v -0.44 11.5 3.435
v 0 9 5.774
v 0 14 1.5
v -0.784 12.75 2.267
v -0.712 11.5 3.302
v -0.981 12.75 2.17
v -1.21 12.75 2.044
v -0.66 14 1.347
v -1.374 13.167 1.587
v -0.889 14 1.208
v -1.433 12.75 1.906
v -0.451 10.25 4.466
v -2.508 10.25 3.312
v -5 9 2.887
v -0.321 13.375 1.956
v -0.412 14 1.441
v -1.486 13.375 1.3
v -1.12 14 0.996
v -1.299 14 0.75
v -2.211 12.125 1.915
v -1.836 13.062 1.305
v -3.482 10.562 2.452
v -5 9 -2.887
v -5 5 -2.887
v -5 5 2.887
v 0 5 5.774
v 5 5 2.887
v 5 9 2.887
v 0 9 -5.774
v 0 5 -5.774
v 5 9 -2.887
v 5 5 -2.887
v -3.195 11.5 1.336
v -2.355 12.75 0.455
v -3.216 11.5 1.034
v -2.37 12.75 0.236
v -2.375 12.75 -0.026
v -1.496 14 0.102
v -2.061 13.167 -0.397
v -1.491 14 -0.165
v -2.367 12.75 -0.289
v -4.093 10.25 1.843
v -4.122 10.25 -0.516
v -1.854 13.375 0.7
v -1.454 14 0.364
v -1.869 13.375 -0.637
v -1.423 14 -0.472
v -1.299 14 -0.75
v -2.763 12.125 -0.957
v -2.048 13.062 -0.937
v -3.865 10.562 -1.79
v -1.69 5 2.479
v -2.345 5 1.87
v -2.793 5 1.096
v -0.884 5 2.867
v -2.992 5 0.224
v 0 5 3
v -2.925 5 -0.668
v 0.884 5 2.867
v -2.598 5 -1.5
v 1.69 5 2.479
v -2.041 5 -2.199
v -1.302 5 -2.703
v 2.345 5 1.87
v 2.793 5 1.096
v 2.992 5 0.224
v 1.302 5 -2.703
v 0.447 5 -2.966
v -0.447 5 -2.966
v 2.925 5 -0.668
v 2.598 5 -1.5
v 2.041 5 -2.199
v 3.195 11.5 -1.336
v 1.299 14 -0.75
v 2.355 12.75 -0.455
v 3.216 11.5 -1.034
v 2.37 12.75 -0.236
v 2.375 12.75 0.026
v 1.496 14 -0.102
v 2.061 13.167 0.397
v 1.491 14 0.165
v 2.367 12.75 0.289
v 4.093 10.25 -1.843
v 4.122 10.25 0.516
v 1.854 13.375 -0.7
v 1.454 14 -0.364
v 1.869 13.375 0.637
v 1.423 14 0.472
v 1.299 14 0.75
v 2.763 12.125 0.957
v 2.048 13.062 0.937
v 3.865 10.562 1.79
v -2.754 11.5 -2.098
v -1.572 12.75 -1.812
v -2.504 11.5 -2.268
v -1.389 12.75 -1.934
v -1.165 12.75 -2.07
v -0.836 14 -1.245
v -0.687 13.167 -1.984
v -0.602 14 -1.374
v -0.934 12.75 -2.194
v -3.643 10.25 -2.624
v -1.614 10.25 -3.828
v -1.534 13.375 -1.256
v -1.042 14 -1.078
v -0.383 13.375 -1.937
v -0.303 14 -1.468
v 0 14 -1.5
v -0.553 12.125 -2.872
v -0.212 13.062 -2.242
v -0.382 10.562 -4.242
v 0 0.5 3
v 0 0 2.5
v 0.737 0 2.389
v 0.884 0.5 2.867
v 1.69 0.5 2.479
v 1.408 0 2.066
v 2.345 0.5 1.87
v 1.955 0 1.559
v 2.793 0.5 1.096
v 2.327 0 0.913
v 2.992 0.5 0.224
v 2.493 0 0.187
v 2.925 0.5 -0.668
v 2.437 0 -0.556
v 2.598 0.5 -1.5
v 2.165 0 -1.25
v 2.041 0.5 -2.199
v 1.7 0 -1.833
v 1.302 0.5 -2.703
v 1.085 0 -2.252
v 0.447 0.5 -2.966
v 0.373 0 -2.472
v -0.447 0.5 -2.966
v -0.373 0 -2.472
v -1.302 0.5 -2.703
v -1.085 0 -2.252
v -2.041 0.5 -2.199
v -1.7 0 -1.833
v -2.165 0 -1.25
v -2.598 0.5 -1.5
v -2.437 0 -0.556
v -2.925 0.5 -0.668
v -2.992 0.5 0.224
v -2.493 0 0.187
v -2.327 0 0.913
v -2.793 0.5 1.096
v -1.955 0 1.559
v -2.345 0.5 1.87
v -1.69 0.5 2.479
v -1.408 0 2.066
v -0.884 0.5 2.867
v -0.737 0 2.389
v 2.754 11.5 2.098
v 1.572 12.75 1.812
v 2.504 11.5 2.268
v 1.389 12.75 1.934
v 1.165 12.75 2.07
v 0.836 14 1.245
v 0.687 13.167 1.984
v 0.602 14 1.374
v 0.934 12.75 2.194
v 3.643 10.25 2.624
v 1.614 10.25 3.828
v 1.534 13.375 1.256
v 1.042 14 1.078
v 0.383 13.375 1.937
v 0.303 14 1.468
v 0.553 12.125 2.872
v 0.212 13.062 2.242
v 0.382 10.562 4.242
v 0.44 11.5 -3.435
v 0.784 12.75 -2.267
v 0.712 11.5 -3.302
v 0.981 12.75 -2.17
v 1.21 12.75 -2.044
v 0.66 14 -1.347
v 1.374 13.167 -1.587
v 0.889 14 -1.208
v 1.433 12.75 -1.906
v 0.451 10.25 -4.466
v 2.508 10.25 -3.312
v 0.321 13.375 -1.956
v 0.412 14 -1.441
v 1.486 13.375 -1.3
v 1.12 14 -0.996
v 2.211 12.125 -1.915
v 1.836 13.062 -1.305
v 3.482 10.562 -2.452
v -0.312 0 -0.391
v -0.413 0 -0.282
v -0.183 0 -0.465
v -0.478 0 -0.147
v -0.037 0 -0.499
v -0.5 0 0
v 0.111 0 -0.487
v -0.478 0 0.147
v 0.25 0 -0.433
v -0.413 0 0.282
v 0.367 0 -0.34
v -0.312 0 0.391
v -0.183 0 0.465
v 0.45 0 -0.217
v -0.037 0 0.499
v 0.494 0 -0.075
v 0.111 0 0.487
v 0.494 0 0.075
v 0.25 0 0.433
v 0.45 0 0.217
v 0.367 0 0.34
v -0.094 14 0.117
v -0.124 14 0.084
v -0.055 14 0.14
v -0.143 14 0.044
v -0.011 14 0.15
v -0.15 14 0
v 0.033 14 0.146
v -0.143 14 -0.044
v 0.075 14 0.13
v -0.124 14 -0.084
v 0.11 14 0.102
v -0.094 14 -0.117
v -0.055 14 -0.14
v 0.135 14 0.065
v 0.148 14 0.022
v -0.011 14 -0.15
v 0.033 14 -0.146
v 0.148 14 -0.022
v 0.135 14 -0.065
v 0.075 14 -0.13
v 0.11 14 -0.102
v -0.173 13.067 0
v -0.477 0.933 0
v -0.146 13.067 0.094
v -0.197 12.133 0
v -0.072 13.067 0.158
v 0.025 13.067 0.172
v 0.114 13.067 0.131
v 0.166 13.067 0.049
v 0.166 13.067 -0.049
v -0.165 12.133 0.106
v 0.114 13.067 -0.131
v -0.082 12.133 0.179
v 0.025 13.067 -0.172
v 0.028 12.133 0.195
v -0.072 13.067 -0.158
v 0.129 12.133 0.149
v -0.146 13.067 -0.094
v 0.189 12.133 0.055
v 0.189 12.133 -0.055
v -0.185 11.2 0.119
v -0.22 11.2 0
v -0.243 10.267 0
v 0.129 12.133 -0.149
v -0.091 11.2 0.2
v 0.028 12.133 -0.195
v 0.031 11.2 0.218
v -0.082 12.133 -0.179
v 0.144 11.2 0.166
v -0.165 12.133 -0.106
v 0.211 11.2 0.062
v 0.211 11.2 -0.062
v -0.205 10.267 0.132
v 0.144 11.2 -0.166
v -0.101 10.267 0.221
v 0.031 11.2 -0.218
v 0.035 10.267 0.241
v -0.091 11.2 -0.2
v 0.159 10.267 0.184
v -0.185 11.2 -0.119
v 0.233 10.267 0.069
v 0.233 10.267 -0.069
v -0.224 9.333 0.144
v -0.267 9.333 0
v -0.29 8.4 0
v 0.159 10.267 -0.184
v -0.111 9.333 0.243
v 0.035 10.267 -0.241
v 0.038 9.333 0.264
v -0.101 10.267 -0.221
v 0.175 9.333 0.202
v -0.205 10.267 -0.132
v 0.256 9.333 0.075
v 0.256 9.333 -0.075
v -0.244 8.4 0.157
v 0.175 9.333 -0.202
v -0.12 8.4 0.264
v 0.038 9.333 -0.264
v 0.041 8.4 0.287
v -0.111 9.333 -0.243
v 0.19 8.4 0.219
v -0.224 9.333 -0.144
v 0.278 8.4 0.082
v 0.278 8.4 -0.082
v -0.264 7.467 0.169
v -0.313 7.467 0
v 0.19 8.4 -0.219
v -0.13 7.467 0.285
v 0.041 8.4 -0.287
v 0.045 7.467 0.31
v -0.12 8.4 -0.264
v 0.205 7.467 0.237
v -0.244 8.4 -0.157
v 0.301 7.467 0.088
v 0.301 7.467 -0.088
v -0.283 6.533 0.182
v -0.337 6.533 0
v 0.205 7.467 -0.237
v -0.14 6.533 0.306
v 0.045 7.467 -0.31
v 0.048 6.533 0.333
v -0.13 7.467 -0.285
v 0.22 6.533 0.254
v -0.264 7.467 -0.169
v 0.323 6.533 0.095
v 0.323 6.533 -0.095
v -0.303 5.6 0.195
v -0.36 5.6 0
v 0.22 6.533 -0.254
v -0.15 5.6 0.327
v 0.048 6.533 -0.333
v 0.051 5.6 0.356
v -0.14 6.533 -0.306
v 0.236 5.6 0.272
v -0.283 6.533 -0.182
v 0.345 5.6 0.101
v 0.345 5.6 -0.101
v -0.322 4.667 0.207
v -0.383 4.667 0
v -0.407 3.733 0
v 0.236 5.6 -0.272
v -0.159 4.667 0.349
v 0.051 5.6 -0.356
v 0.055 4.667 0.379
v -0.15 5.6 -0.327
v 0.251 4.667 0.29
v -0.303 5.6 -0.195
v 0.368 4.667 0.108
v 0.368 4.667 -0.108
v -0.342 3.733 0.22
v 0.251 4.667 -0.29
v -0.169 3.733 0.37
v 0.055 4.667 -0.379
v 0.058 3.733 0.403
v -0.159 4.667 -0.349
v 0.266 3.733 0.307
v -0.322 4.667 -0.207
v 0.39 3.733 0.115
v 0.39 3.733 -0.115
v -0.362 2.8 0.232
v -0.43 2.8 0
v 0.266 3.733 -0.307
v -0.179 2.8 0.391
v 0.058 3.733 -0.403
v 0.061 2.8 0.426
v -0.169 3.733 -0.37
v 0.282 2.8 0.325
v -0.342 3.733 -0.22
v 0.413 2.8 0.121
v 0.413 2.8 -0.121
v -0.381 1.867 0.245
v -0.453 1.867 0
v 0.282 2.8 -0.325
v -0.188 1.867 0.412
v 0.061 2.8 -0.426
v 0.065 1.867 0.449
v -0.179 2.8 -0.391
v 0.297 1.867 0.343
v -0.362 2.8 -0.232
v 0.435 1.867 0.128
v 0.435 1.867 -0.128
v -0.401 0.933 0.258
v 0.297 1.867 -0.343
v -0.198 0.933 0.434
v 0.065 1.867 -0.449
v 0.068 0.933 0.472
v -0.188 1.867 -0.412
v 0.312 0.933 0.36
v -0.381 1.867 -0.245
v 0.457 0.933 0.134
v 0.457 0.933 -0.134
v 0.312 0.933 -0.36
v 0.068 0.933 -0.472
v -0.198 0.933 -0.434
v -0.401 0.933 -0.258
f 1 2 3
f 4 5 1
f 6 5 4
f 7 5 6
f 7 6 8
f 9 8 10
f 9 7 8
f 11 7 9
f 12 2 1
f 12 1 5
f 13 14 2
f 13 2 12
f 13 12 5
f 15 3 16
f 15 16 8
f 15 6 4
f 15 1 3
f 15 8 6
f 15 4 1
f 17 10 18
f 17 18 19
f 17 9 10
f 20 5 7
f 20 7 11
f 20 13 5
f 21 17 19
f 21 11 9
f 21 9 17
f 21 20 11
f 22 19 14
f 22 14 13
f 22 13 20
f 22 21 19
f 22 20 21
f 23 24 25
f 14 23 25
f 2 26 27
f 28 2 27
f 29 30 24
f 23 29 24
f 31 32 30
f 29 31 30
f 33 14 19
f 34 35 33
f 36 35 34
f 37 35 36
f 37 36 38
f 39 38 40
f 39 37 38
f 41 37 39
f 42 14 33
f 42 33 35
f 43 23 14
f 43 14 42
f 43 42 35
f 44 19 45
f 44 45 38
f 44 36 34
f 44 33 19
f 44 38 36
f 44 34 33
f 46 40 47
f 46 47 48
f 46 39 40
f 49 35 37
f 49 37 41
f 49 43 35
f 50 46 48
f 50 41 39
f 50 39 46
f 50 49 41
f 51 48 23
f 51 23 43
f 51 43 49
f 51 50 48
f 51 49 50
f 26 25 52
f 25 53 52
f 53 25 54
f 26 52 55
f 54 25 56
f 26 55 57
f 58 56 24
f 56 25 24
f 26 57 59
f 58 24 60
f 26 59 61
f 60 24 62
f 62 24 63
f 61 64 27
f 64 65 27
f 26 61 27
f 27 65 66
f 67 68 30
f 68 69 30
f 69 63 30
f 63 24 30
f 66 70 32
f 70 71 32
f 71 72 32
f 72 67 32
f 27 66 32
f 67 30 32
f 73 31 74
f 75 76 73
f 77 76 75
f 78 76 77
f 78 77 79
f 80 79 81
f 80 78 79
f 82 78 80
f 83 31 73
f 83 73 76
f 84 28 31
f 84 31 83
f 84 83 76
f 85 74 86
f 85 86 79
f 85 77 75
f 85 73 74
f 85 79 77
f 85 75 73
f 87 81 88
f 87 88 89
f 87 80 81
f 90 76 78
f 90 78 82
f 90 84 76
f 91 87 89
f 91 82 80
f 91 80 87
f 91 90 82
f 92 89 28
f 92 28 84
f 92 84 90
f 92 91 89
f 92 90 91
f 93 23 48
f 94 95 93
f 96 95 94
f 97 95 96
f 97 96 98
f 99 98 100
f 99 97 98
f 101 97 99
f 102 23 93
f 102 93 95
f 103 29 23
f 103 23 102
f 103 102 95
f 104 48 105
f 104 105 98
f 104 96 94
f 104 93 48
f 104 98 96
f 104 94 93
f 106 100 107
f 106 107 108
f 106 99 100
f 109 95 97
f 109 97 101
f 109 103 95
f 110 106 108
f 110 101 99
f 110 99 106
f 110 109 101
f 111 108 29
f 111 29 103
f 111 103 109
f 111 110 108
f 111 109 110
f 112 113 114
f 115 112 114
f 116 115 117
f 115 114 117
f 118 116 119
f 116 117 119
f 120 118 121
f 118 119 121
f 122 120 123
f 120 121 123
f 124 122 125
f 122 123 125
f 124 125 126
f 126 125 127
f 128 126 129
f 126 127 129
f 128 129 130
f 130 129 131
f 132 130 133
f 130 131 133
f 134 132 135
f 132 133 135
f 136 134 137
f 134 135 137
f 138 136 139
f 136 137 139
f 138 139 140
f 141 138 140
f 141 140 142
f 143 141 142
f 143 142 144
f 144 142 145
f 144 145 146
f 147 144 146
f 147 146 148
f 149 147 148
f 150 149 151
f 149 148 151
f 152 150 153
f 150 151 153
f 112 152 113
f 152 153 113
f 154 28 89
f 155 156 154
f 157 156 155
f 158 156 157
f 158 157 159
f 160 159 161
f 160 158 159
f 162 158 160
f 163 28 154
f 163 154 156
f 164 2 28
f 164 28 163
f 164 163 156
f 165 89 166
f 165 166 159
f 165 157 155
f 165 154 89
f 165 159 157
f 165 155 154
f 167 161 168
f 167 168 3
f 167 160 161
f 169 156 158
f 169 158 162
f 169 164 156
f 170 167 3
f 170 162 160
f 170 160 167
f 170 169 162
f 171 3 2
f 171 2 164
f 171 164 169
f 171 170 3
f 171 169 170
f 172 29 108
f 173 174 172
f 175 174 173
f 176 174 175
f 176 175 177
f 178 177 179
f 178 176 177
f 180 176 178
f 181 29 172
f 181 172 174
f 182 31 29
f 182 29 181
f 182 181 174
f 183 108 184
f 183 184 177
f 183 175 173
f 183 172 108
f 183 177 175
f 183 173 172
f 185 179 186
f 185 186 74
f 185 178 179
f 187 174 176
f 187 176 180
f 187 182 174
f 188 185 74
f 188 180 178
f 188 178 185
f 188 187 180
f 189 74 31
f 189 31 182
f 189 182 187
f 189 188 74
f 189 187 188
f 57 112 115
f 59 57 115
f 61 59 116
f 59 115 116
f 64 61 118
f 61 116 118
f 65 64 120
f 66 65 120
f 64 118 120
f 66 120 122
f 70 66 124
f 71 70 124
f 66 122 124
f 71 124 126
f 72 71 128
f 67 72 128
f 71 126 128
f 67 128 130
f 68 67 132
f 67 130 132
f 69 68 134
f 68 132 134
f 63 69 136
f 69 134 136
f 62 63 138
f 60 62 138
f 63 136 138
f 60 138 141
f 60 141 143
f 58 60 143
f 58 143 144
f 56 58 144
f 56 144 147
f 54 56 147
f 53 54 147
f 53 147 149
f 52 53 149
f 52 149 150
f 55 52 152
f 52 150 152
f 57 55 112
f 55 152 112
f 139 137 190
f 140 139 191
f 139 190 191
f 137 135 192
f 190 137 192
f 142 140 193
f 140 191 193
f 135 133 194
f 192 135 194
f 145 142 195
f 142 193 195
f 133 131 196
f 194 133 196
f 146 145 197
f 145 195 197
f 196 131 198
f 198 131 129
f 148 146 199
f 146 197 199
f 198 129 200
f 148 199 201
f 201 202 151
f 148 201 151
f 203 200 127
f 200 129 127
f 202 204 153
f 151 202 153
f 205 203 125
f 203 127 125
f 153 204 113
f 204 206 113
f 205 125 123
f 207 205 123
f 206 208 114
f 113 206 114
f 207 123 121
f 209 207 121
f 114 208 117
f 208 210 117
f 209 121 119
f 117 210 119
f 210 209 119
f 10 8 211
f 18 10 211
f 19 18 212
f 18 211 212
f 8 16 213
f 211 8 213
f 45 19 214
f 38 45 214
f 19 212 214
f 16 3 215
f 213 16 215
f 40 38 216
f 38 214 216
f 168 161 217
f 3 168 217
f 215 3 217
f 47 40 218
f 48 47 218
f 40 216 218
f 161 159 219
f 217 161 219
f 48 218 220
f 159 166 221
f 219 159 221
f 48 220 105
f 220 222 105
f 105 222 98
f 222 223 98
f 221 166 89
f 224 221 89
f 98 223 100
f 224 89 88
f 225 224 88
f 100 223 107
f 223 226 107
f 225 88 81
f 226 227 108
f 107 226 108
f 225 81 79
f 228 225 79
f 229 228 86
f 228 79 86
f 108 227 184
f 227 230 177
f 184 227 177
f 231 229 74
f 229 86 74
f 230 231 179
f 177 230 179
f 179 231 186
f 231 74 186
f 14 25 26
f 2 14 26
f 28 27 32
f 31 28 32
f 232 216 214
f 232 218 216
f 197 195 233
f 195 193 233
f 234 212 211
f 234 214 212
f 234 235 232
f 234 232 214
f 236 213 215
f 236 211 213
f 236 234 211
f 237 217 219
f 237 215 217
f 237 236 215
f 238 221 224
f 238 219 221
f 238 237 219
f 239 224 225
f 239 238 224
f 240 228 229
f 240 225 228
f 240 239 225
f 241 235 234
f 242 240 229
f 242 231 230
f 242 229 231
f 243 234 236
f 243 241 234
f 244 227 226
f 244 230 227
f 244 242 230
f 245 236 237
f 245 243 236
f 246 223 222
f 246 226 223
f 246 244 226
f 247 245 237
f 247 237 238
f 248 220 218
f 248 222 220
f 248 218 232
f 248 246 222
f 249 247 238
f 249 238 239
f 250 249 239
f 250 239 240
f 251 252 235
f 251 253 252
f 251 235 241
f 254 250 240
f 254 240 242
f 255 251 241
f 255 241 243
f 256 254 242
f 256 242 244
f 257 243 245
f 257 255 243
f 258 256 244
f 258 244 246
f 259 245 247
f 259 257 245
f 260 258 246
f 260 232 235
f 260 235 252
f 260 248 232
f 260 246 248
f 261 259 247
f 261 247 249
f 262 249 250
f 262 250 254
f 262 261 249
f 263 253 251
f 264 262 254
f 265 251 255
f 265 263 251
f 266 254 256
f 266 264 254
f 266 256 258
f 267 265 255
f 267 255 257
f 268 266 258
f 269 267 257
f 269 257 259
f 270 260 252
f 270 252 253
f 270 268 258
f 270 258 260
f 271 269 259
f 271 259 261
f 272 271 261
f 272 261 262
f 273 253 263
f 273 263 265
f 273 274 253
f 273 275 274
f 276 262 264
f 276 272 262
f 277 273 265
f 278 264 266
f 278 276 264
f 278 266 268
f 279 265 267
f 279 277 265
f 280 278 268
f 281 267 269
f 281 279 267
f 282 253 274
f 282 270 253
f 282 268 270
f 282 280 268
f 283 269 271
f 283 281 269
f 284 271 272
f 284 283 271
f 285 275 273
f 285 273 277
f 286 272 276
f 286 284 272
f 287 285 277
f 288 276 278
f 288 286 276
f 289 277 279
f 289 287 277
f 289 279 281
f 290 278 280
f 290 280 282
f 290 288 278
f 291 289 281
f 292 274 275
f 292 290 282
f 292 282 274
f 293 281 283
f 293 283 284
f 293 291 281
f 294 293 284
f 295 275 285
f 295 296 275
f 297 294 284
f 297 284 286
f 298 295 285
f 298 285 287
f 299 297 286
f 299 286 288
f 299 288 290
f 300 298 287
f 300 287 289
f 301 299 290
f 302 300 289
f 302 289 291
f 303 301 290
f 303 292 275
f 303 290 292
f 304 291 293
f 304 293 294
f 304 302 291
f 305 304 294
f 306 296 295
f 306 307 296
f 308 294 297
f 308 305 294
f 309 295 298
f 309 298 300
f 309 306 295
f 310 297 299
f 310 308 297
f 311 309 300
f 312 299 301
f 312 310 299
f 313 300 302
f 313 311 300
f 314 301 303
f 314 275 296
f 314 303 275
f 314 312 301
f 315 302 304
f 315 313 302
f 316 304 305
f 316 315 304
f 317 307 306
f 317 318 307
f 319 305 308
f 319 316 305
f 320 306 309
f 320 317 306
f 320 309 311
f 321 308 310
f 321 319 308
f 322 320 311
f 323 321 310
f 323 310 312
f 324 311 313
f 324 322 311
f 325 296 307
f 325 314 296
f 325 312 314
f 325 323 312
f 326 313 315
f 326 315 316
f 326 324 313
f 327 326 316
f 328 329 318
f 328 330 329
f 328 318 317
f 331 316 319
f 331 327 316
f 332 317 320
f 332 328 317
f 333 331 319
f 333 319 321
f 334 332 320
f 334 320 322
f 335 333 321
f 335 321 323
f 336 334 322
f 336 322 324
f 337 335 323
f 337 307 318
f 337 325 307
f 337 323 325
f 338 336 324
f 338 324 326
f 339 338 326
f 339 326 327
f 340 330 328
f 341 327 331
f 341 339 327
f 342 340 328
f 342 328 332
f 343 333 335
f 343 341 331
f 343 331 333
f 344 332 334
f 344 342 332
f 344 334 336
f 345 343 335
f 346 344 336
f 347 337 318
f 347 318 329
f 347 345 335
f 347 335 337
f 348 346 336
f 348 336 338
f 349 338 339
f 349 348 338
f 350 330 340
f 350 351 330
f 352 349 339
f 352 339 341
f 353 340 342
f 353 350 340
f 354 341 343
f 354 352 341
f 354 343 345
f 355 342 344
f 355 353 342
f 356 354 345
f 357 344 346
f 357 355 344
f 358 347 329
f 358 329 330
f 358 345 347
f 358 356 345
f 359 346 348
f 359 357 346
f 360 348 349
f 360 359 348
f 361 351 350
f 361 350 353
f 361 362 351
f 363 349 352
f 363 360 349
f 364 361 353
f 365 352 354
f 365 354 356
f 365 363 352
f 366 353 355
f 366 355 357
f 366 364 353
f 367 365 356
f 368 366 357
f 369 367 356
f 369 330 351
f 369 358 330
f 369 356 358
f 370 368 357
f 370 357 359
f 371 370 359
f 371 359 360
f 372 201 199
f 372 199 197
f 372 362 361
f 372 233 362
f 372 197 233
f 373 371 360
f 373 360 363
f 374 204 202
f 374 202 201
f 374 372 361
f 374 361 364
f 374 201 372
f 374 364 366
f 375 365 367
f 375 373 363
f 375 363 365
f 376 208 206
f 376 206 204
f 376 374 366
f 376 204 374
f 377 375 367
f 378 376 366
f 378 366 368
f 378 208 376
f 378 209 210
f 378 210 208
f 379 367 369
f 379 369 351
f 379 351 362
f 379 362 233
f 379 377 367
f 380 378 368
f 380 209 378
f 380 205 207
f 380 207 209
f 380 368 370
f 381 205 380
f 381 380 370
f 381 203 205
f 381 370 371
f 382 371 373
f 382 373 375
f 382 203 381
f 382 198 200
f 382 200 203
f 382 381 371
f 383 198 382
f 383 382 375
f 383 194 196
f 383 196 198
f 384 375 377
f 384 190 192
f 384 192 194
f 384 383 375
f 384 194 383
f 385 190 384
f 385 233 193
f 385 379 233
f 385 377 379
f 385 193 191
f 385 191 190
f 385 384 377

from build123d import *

# Parameters (mm, degrees)
SKETCH1_R           = 3
BOSS_EXTRUDE1_DEPTH = 5
BOSS_EXTRUDE2_DEPTH = 4
CHAMFER1_SIZE       = 0.5
SKETCH5_R           = 0.15
SKETCH4_R           = 0.5


with BuildPart() as part:
    # Sketch1 → Boss-Extrude1 (new body)
    with BuildSketch(Plane(origin=(0, 0, 0), x_dir=(1, 0, 0), z_dir=(0, 1, 0))):
        with Locations(Location((0, 0, 0), (0, 0, 270))):
            Circle(SKETCH1_R)
    extrude(amount=BOSS_EXTRUDE1_DEPTH)

    # Sketch2 → Boss-Extrude2 (add)
    with BuildSketch(Plane(origin=(0, 5, 0), x_dir=(1, 0, 0), z_dir=(0, 1, 0))):
        Polygon((0, 5.773502692), (-5, 2.886751346), (-5, -2.886751346), (0, -5.773502692), (5, -2.886751346), (5, 2.886751346), align=None)
    extrude(amount=BOSS_EXTRUDE2_DEPTH)

    # Chamfer1
    chamfer1_edges = [part.edges().sort_by_distance(p)[0] for p in [
        (0, 0, -3),
    ]]
    chamfer(chamfer1_edges, length=CHAMFER1_SIZE)

    # Loft1: read off the stored shape, not the designer's step
    # Loft1: loft between two sections, ruled curve by curve
    loft1_from = [
        Edge.make_bspline([(1.299038106, 14, -0.75), (1.424038106, 14, -0.533493649), (1.5, 14, -0.267949192), (1.5, 14, 0.267949192), (1.424038106, 14, 0.533493649), (1.299038106, 14, 0.75)], [0, 0, 0, 0, 0.5, 0.5, 1, 1, 1, 1], 3),
        Edge.make_bspline([(1.299038106, 14, 0.75), (1.174038106, 14, 0.966506351), (0.982050808, 14, 1.165063509), (0.517949192, 14, 1.433012702), (0.25, 14, 1.5), (0, 14, 1.5)], [0, 0, 0, 0, 0.5, 0.5, 1, 1, 1, 1], 3),
        Edge.make_bspline([(0, 14, -1.5), (0.25, 14, -1.5), (0.517949192, 14, -1.433012702), (0.982050808, 14, -1.165063509), (1.174038106, 14, -0.966506351), (1.299038106, 14, -0.75)], [0, 0, 0, 0, 0.5, 0.5, 1, 1, 1, 1], 3),
        Edge.make_bspline([(0, 14, 1.5), (-0.25, 14, 1.5), (-0.517949192, 14, 1.433012702), (-0.982050808, 14, 1.165063509), (-1.174038106, 14, 0.966506351), (-1.299038106, 14, 0.75)], [0, 0, 0, 0, 0.5, 0.5, 1, 1, 1, 1], 3),
        Edge.make_bspline([(-1.299038106, 14, 0.75), (-1.424038106, 14, 0.533493649), (-1.5, 14, 0.267949192), (-1.5, 14, -0.267949192), (-1.424038106, 14, -0.533493649), (-1.299038106, 14, -0.75)], [0, 0, 0, 0, 0.5, 0.5, 1, 1, 1, 1], 3),
        Edge.make_bspline([(-1.299038106, 14, -0.75), (-1.174038106, 14, -0.966506351), (-0.982050808, 14, -1.165063509), (-0.517949192, 14, -1.433012702), (-0.25, 14, -1.5), (0, 14, -1.5)], [0, 0, 0, 0, 0.5, 0.5, 1, 1, 1, 1], 3),
    ]
    loft1_to = [
        Edge.make_bspline([(5, 9, -2.886751346), (5, 9, -1.924500897), (5, 9, -0.962250449), (5, 9, 0.962250449), (5, 9, 1.924500897), (5, 9, 2.886751346)], [0, 0, 0, 0, 0.5, 0.5, 1, 1, 1, 1], 3),
        Edge.make_bspline([(5, 9, 2.886751346), (4.166666667, 9, 3.36787657), (3.333333333, 9, 3.849001795), (1.666666667, 9, 4.811252243), (0.833333333, 9, 5.292377468), (0, 9, 5.773502692)], [0, 0, 0, 0, 0.5, 0.5, 1, 1, 1, 1], 3),
        Edge.make_bspline([(0, 9, -5.773502692), (0.833333333, 9, -5.292377468), (1.666666667, 9, -4.811252243), (3.333333333, 9, -3.849001795), (4.166666667, 9, -3.36787657), (5, 9, -2.886751346)], [0, 0, 0, 0, 0.5, 0.5, 1, 1, 1, 1], 3),
        Edge.make_bspline([(0, 9, 5.773502692), (-0.833333333, 9, 5.292377468), (-1.666666667, 9, 4.811252243), (-3.333333333, 9, 3.849001795), (-4.166666667, 9, 3.36787657), (-5, 9, 2.886751346)], [0, 0, 0, 0, 0.5, 0.5, 1, 1, 1, 1], 3),
        Edge.make_bspline([(-5, 9, 2.886751346), (-5, 9, 1.924500897), (-5, 9, 0.962250449), (-5, 9, -0.962250449), (-5, 9, -1.924500897), (-5, 9, -2.886751346)], [0, 0, 0, 0, 0.5, 0.5, 1, 1, 1, 1], 3),
        Edge.make_bspline([(-5, 9, -2.886751346), (-4.166666667, 9, -3.36787657), (-3.333333333, 9, -3.849001795), (-1.666666667, 9, -4.811252243), (-0.833333333, 9, -5.292377468), (0, 9, -5.773502692)], [0, 0, 0, 0, 0.5, 0.5, 1, 1, 1, 1], 3),
    ]
    loft1 = Solid(Shell([*[Face.make_surface_from_curves(loft1_from[k], loft1_to[k]) for k in range(6)], Face(Wire(loft1_from)), Face(Wire(loft1_to))]))
    add(loft1)

    # Sketch5 → Cut-Loft1 section 0
    with BuildSketch(Plane(origin=(0, 14, 0), x_dir=(-1, 0, 0), z_dir=(0, 1, 0))):
        Circle(SKETCH5_R)
    # Sketch4 → Cut-Loft1 section 1
    with BuildSketch(Plane.XZ):
        Circle(SKETCH4_R)
    loft(mode=Mode.SUBTRACT)


solid = part.part
